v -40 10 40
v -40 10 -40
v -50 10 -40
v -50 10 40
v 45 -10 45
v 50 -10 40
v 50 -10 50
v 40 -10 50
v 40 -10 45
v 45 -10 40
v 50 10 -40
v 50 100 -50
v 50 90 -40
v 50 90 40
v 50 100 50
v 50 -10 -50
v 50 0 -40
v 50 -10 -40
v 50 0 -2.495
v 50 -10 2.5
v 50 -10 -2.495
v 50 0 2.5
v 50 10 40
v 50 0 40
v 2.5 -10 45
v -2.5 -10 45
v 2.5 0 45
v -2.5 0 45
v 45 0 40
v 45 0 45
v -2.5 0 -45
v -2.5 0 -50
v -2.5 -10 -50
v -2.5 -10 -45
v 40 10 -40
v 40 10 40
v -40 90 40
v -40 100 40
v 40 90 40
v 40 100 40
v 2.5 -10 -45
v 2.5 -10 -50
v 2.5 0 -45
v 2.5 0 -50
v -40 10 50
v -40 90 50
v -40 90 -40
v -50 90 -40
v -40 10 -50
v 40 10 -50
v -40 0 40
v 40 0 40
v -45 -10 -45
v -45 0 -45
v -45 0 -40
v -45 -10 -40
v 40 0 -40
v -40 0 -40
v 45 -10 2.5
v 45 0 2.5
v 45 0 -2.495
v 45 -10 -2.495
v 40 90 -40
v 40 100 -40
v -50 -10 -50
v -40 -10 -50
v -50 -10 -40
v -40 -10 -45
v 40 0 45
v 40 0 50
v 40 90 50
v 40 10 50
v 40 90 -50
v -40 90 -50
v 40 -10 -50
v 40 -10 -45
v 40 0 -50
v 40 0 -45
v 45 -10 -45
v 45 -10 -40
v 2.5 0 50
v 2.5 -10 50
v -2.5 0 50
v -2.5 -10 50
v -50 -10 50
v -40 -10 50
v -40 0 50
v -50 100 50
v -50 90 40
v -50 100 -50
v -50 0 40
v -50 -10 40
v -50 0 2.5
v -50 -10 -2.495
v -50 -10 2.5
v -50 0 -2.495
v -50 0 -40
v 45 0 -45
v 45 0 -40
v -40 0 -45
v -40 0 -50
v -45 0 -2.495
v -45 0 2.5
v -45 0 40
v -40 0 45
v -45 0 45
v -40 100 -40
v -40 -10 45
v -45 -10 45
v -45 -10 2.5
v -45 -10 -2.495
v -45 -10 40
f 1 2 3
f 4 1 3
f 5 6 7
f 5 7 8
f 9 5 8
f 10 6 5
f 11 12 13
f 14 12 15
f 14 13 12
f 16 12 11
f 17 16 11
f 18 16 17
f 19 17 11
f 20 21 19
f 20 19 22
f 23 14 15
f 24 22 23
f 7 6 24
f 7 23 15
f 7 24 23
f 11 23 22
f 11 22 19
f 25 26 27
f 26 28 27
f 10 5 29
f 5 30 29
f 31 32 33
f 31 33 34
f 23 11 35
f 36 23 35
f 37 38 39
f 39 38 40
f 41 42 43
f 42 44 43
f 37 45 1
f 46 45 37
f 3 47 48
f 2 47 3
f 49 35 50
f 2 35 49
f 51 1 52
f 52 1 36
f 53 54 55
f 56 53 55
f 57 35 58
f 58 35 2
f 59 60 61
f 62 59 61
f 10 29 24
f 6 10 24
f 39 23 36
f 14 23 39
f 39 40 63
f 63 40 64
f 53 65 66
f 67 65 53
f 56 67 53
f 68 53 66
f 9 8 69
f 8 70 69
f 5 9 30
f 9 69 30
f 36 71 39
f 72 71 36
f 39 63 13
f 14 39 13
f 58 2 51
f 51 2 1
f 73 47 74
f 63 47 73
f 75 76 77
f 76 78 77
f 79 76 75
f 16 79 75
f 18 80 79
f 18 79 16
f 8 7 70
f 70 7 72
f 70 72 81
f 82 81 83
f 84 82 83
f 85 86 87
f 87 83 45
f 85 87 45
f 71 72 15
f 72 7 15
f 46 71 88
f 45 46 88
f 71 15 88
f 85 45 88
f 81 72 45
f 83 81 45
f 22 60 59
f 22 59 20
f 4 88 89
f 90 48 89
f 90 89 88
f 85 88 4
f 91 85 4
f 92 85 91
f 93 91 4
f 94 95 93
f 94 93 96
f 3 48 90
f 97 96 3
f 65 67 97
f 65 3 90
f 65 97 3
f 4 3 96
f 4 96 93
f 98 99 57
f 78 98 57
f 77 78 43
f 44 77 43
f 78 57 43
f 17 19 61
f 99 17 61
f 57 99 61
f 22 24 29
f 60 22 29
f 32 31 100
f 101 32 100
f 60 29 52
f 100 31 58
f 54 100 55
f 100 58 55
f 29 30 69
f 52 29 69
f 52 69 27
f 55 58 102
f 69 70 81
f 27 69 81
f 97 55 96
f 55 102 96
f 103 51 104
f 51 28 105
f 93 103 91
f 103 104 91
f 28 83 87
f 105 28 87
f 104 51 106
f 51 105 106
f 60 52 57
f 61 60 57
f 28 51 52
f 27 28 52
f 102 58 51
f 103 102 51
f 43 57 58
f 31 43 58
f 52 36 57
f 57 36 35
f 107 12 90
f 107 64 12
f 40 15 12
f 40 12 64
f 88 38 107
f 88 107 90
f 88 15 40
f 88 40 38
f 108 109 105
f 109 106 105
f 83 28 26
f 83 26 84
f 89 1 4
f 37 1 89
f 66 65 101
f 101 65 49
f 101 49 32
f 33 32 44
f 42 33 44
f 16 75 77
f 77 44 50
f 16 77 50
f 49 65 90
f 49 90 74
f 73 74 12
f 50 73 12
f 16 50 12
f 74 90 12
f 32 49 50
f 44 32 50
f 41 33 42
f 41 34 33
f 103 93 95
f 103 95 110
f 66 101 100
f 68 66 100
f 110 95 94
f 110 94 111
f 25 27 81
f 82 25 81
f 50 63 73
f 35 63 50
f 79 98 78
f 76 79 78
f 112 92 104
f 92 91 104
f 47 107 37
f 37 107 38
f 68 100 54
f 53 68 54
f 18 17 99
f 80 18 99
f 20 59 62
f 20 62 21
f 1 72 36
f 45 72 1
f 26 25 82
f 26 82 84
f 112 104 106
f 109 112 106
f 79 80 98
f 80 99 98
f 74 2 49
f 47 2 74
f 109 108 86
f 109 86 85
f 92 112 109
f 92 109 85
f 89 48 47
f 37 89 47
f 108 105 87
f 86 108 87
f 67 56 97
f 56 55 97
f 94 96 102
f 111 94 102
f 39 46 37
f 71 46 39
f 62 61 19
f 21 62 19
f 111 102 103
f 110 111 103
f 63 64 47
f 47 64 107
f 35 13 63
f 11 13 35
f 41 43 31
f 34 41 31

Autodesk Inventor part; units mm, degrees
ref_plane "YZ Plane" through (0, 0, 0) normal (1, 0, 0) x (0, 1, 0)
ref_plane "XZ Plane" through (0, 0, 0) normal (0, 1, 0) x (-1, 0, 0)
ref_plane "XY Plane" through (0, 0, 0) normal (0, 0, 1) x (1, 0, 0)
sketch "Sketch1" plane through (0, 0, 0) normal (0, 1, 0) x (-1, 0, 0)
  line L0 (50, -50) -> (-50, -50)
  line L1 (-50, -50) -> (-50, 50)
  line L2 (-50, 50) -> (50, 50)
  line L3 (50, 50) -> (50, -50)
  point P0 (0, 0)
  dimension "d0" = 100
  dimension "d1" = 100
  dimension "d2" = 50
  dimension "d3" = 50
extrude "Extrusion1" add sketch "Sketch1" along normal blind 100
sketch "Sketch2" plane through (-50, 0, 50) normal (0, 0, 1) x (1, 0, 0)
  line L0 (10, 90) -> (90, 90)
  line L1 (90, 90) -> (90, 10)
  line L2 (90, 10) -> (10, 10)
  line L3 (10, 10) -> (10, 90)
  line L4 (100, 0) -> (0, 0) projected
  line L5 (100, 0) -> (100, 100) projected
  point P0 (50, 0)
  dimension "d6" = 80
  dimension "d7" = 10
  dimension "d8" = 80
  dimension "d9" = 10
extrude "Extrusion2" cut sketch "Sketch2" against normal blind 100
sketch "Sketch3" plane through (50, 0, 50) normal (1, 0, 0) x (0, 0, -1)
  line L0 (10, 90) -> (90, 90)
  line L1 (90, 90) -> (90, 10)
  line L2 (90, 10) -> (10, 10)
  line L3 (10, 10) -> (10, 90)
  line L4 (0, 100) -> (100, 100) projected
  line L5 (100, 0) -> (100, 100) projected
  point P0 (50, 0)
  dimension "d12" = 80
  dimension "d13" = 10
  dimension "d14" = 80
  dimension "d15" = 10
extrude "Extrusion3" cut sketch "Sketch3" against normal blind 100
sketch "Sketch4" plane through (0, 100, 0) normal (0, 1, 0) x (1, 0, 0)
  line L0 (-40, -50) -> (-40, -40) projected
  line L1 (50, 40) -> (40, 40) projected
  line L2 (-40, -40) -> (40, -40)
  line L3 (40, -40) -> (40, 40)
  line L4 (40, 40) -> (-40, 40)
  line L5 (-40, 40) -> (-40, -40)
  point P0 (0, 0)
extrude "Extrusion4" cut sketch "Sketch4" against normal blind 100
sketch "Sketch9" plane through (0, 0, 0) normal (0, -1, 0) x (1, 0, 0)
  line L0 (50, 0.0049) -> (45, 0.0049)
  line L1 (45, 0.0049) -> (45, -2.4951)
  line L2 (45, -2.4951) -> (50, -2.4951)
  line L3 (50, -2.4951) -> (50, 0.0049)
  line L4 (40, 40) -> (40, -40) projected
  point P0 (0, 0)
  dimension "d40" = 5
  dimension "d41" = 5
  dimension "d42" = 2.5
sketch "Sketch10" plane through (0, 0, 0) normal (0, -1, 0) x (1, 0, 0)
  line L0 (50, -40) -> (50, 40) projected
  line L1 (50, 0) -> (45, 0)
  line L2 (45, 0) -> (45, 2.5)
  line L3 (45, 2.5) -> (50, 2.5)
  line L4 (50, 2.5) -> (50, 0)
  line L5 (40, 40) -> (40, -40) projected
  point P0 (0, 0)
  dimension "d43" = 2.5
  dimension "d44" = 5
extrude "Extrusion9" add sketch "Sketch9" along normal blind 10
extrude "Extrusion10" add sketch "Sketch10" along normal blind 10
mirror "Mirror3" about plane through (0, 0, 0) normal (1, 0, 0) of "Extrusion9", "Extrusion10"
sketch "Sketch11" plane through (0, 0, 0) normal (0, -1, 0) x (1, 0, 0)
  line L0 (-40, -50) -> (40, -50) projected
  line L1 (0, -50) -> (-2.5, -50)
  line L2 (-2.5, -50) -> (-2.5, -45)
  line L3 (-2.5, -45) -> (0, -45)
  line L4 (0, -45) -> (0, -50)
  line L5 (40, -40) -> (-40, -40) projected
  point P0 (0, 0)
  dimension "d49" = 5
  dimension "d50" = 2.5
sketch "Sketch12" plane through (0, 0, 0) normal (0, -1, 0) x (1, 0, 0)
  line L0 (-40, -50) -> (40, -50) projected
  line L1 (0, -50) -> (2.5, -50)
  line L2 (2.5, -50) -> (2.5, -45)
  line L3 (2.5, -45) -> (0, -45)
  line L4 (0, -45) -> (0, -50)
  line L5 (40, -40) -> (-40, -40) projected
  point P0 (0, 0)
  dimension "d51" = 5
  dimension "d52" = 2.5
extrude "Extrusion11" add sketch "Sketch11" along normal blind 10
extrude "Extrusion12" add sketch "Sketch12" along normal blind 10
mirror "Mirror4" about plane through (0, 0, 0) normal (0, 0, 1) of "Extrusion11", "Extrusion12"
sketch "Sketch13" plane through (0, 0, 0) normal (0, -1, 0) x (1, 0, 0)
  line L0 (50, -40) -> (50, 40) projected
  line L1 (50, -50) -> (-50, -50) projected
  line L2 (50, -40) -> (45, -40)
  line L3 (45, -40) -> (45, -50)
  line L4 (45, -50) -> (50, -50)
  line L5 (50, -50) -> (50, -40)
  line L6 (40, 40) -> (40, -40) projected
  line L7 (45, -45) -> (40, -45)
  line L8 (40, -45) -> (40, -50)
  line L9 (40, -50) -> (45, -50)
  line L10 (45, -50) -> (45, -45)
  point P0 (0, 0)
  dimension "d57" = 5
extrude "Extrusion13" add sketch "Sketch13" along normal blind 10
mirror "Mirror5" about plane through (0, 0, 0) normal (0, 0, 1) of "Extrusion13"
mirror "Mirror6" about plane through (0, 0, 0) normal (1, 0, 0) of "Extrusion13"
mirror "Mirror7" about plane through (0, 0, 0) normal (0, 0, 1) of "Extrusion13", "Mirror6"
properties part number "Kens_cube_of_fun_design_withpegs_spencermical"
